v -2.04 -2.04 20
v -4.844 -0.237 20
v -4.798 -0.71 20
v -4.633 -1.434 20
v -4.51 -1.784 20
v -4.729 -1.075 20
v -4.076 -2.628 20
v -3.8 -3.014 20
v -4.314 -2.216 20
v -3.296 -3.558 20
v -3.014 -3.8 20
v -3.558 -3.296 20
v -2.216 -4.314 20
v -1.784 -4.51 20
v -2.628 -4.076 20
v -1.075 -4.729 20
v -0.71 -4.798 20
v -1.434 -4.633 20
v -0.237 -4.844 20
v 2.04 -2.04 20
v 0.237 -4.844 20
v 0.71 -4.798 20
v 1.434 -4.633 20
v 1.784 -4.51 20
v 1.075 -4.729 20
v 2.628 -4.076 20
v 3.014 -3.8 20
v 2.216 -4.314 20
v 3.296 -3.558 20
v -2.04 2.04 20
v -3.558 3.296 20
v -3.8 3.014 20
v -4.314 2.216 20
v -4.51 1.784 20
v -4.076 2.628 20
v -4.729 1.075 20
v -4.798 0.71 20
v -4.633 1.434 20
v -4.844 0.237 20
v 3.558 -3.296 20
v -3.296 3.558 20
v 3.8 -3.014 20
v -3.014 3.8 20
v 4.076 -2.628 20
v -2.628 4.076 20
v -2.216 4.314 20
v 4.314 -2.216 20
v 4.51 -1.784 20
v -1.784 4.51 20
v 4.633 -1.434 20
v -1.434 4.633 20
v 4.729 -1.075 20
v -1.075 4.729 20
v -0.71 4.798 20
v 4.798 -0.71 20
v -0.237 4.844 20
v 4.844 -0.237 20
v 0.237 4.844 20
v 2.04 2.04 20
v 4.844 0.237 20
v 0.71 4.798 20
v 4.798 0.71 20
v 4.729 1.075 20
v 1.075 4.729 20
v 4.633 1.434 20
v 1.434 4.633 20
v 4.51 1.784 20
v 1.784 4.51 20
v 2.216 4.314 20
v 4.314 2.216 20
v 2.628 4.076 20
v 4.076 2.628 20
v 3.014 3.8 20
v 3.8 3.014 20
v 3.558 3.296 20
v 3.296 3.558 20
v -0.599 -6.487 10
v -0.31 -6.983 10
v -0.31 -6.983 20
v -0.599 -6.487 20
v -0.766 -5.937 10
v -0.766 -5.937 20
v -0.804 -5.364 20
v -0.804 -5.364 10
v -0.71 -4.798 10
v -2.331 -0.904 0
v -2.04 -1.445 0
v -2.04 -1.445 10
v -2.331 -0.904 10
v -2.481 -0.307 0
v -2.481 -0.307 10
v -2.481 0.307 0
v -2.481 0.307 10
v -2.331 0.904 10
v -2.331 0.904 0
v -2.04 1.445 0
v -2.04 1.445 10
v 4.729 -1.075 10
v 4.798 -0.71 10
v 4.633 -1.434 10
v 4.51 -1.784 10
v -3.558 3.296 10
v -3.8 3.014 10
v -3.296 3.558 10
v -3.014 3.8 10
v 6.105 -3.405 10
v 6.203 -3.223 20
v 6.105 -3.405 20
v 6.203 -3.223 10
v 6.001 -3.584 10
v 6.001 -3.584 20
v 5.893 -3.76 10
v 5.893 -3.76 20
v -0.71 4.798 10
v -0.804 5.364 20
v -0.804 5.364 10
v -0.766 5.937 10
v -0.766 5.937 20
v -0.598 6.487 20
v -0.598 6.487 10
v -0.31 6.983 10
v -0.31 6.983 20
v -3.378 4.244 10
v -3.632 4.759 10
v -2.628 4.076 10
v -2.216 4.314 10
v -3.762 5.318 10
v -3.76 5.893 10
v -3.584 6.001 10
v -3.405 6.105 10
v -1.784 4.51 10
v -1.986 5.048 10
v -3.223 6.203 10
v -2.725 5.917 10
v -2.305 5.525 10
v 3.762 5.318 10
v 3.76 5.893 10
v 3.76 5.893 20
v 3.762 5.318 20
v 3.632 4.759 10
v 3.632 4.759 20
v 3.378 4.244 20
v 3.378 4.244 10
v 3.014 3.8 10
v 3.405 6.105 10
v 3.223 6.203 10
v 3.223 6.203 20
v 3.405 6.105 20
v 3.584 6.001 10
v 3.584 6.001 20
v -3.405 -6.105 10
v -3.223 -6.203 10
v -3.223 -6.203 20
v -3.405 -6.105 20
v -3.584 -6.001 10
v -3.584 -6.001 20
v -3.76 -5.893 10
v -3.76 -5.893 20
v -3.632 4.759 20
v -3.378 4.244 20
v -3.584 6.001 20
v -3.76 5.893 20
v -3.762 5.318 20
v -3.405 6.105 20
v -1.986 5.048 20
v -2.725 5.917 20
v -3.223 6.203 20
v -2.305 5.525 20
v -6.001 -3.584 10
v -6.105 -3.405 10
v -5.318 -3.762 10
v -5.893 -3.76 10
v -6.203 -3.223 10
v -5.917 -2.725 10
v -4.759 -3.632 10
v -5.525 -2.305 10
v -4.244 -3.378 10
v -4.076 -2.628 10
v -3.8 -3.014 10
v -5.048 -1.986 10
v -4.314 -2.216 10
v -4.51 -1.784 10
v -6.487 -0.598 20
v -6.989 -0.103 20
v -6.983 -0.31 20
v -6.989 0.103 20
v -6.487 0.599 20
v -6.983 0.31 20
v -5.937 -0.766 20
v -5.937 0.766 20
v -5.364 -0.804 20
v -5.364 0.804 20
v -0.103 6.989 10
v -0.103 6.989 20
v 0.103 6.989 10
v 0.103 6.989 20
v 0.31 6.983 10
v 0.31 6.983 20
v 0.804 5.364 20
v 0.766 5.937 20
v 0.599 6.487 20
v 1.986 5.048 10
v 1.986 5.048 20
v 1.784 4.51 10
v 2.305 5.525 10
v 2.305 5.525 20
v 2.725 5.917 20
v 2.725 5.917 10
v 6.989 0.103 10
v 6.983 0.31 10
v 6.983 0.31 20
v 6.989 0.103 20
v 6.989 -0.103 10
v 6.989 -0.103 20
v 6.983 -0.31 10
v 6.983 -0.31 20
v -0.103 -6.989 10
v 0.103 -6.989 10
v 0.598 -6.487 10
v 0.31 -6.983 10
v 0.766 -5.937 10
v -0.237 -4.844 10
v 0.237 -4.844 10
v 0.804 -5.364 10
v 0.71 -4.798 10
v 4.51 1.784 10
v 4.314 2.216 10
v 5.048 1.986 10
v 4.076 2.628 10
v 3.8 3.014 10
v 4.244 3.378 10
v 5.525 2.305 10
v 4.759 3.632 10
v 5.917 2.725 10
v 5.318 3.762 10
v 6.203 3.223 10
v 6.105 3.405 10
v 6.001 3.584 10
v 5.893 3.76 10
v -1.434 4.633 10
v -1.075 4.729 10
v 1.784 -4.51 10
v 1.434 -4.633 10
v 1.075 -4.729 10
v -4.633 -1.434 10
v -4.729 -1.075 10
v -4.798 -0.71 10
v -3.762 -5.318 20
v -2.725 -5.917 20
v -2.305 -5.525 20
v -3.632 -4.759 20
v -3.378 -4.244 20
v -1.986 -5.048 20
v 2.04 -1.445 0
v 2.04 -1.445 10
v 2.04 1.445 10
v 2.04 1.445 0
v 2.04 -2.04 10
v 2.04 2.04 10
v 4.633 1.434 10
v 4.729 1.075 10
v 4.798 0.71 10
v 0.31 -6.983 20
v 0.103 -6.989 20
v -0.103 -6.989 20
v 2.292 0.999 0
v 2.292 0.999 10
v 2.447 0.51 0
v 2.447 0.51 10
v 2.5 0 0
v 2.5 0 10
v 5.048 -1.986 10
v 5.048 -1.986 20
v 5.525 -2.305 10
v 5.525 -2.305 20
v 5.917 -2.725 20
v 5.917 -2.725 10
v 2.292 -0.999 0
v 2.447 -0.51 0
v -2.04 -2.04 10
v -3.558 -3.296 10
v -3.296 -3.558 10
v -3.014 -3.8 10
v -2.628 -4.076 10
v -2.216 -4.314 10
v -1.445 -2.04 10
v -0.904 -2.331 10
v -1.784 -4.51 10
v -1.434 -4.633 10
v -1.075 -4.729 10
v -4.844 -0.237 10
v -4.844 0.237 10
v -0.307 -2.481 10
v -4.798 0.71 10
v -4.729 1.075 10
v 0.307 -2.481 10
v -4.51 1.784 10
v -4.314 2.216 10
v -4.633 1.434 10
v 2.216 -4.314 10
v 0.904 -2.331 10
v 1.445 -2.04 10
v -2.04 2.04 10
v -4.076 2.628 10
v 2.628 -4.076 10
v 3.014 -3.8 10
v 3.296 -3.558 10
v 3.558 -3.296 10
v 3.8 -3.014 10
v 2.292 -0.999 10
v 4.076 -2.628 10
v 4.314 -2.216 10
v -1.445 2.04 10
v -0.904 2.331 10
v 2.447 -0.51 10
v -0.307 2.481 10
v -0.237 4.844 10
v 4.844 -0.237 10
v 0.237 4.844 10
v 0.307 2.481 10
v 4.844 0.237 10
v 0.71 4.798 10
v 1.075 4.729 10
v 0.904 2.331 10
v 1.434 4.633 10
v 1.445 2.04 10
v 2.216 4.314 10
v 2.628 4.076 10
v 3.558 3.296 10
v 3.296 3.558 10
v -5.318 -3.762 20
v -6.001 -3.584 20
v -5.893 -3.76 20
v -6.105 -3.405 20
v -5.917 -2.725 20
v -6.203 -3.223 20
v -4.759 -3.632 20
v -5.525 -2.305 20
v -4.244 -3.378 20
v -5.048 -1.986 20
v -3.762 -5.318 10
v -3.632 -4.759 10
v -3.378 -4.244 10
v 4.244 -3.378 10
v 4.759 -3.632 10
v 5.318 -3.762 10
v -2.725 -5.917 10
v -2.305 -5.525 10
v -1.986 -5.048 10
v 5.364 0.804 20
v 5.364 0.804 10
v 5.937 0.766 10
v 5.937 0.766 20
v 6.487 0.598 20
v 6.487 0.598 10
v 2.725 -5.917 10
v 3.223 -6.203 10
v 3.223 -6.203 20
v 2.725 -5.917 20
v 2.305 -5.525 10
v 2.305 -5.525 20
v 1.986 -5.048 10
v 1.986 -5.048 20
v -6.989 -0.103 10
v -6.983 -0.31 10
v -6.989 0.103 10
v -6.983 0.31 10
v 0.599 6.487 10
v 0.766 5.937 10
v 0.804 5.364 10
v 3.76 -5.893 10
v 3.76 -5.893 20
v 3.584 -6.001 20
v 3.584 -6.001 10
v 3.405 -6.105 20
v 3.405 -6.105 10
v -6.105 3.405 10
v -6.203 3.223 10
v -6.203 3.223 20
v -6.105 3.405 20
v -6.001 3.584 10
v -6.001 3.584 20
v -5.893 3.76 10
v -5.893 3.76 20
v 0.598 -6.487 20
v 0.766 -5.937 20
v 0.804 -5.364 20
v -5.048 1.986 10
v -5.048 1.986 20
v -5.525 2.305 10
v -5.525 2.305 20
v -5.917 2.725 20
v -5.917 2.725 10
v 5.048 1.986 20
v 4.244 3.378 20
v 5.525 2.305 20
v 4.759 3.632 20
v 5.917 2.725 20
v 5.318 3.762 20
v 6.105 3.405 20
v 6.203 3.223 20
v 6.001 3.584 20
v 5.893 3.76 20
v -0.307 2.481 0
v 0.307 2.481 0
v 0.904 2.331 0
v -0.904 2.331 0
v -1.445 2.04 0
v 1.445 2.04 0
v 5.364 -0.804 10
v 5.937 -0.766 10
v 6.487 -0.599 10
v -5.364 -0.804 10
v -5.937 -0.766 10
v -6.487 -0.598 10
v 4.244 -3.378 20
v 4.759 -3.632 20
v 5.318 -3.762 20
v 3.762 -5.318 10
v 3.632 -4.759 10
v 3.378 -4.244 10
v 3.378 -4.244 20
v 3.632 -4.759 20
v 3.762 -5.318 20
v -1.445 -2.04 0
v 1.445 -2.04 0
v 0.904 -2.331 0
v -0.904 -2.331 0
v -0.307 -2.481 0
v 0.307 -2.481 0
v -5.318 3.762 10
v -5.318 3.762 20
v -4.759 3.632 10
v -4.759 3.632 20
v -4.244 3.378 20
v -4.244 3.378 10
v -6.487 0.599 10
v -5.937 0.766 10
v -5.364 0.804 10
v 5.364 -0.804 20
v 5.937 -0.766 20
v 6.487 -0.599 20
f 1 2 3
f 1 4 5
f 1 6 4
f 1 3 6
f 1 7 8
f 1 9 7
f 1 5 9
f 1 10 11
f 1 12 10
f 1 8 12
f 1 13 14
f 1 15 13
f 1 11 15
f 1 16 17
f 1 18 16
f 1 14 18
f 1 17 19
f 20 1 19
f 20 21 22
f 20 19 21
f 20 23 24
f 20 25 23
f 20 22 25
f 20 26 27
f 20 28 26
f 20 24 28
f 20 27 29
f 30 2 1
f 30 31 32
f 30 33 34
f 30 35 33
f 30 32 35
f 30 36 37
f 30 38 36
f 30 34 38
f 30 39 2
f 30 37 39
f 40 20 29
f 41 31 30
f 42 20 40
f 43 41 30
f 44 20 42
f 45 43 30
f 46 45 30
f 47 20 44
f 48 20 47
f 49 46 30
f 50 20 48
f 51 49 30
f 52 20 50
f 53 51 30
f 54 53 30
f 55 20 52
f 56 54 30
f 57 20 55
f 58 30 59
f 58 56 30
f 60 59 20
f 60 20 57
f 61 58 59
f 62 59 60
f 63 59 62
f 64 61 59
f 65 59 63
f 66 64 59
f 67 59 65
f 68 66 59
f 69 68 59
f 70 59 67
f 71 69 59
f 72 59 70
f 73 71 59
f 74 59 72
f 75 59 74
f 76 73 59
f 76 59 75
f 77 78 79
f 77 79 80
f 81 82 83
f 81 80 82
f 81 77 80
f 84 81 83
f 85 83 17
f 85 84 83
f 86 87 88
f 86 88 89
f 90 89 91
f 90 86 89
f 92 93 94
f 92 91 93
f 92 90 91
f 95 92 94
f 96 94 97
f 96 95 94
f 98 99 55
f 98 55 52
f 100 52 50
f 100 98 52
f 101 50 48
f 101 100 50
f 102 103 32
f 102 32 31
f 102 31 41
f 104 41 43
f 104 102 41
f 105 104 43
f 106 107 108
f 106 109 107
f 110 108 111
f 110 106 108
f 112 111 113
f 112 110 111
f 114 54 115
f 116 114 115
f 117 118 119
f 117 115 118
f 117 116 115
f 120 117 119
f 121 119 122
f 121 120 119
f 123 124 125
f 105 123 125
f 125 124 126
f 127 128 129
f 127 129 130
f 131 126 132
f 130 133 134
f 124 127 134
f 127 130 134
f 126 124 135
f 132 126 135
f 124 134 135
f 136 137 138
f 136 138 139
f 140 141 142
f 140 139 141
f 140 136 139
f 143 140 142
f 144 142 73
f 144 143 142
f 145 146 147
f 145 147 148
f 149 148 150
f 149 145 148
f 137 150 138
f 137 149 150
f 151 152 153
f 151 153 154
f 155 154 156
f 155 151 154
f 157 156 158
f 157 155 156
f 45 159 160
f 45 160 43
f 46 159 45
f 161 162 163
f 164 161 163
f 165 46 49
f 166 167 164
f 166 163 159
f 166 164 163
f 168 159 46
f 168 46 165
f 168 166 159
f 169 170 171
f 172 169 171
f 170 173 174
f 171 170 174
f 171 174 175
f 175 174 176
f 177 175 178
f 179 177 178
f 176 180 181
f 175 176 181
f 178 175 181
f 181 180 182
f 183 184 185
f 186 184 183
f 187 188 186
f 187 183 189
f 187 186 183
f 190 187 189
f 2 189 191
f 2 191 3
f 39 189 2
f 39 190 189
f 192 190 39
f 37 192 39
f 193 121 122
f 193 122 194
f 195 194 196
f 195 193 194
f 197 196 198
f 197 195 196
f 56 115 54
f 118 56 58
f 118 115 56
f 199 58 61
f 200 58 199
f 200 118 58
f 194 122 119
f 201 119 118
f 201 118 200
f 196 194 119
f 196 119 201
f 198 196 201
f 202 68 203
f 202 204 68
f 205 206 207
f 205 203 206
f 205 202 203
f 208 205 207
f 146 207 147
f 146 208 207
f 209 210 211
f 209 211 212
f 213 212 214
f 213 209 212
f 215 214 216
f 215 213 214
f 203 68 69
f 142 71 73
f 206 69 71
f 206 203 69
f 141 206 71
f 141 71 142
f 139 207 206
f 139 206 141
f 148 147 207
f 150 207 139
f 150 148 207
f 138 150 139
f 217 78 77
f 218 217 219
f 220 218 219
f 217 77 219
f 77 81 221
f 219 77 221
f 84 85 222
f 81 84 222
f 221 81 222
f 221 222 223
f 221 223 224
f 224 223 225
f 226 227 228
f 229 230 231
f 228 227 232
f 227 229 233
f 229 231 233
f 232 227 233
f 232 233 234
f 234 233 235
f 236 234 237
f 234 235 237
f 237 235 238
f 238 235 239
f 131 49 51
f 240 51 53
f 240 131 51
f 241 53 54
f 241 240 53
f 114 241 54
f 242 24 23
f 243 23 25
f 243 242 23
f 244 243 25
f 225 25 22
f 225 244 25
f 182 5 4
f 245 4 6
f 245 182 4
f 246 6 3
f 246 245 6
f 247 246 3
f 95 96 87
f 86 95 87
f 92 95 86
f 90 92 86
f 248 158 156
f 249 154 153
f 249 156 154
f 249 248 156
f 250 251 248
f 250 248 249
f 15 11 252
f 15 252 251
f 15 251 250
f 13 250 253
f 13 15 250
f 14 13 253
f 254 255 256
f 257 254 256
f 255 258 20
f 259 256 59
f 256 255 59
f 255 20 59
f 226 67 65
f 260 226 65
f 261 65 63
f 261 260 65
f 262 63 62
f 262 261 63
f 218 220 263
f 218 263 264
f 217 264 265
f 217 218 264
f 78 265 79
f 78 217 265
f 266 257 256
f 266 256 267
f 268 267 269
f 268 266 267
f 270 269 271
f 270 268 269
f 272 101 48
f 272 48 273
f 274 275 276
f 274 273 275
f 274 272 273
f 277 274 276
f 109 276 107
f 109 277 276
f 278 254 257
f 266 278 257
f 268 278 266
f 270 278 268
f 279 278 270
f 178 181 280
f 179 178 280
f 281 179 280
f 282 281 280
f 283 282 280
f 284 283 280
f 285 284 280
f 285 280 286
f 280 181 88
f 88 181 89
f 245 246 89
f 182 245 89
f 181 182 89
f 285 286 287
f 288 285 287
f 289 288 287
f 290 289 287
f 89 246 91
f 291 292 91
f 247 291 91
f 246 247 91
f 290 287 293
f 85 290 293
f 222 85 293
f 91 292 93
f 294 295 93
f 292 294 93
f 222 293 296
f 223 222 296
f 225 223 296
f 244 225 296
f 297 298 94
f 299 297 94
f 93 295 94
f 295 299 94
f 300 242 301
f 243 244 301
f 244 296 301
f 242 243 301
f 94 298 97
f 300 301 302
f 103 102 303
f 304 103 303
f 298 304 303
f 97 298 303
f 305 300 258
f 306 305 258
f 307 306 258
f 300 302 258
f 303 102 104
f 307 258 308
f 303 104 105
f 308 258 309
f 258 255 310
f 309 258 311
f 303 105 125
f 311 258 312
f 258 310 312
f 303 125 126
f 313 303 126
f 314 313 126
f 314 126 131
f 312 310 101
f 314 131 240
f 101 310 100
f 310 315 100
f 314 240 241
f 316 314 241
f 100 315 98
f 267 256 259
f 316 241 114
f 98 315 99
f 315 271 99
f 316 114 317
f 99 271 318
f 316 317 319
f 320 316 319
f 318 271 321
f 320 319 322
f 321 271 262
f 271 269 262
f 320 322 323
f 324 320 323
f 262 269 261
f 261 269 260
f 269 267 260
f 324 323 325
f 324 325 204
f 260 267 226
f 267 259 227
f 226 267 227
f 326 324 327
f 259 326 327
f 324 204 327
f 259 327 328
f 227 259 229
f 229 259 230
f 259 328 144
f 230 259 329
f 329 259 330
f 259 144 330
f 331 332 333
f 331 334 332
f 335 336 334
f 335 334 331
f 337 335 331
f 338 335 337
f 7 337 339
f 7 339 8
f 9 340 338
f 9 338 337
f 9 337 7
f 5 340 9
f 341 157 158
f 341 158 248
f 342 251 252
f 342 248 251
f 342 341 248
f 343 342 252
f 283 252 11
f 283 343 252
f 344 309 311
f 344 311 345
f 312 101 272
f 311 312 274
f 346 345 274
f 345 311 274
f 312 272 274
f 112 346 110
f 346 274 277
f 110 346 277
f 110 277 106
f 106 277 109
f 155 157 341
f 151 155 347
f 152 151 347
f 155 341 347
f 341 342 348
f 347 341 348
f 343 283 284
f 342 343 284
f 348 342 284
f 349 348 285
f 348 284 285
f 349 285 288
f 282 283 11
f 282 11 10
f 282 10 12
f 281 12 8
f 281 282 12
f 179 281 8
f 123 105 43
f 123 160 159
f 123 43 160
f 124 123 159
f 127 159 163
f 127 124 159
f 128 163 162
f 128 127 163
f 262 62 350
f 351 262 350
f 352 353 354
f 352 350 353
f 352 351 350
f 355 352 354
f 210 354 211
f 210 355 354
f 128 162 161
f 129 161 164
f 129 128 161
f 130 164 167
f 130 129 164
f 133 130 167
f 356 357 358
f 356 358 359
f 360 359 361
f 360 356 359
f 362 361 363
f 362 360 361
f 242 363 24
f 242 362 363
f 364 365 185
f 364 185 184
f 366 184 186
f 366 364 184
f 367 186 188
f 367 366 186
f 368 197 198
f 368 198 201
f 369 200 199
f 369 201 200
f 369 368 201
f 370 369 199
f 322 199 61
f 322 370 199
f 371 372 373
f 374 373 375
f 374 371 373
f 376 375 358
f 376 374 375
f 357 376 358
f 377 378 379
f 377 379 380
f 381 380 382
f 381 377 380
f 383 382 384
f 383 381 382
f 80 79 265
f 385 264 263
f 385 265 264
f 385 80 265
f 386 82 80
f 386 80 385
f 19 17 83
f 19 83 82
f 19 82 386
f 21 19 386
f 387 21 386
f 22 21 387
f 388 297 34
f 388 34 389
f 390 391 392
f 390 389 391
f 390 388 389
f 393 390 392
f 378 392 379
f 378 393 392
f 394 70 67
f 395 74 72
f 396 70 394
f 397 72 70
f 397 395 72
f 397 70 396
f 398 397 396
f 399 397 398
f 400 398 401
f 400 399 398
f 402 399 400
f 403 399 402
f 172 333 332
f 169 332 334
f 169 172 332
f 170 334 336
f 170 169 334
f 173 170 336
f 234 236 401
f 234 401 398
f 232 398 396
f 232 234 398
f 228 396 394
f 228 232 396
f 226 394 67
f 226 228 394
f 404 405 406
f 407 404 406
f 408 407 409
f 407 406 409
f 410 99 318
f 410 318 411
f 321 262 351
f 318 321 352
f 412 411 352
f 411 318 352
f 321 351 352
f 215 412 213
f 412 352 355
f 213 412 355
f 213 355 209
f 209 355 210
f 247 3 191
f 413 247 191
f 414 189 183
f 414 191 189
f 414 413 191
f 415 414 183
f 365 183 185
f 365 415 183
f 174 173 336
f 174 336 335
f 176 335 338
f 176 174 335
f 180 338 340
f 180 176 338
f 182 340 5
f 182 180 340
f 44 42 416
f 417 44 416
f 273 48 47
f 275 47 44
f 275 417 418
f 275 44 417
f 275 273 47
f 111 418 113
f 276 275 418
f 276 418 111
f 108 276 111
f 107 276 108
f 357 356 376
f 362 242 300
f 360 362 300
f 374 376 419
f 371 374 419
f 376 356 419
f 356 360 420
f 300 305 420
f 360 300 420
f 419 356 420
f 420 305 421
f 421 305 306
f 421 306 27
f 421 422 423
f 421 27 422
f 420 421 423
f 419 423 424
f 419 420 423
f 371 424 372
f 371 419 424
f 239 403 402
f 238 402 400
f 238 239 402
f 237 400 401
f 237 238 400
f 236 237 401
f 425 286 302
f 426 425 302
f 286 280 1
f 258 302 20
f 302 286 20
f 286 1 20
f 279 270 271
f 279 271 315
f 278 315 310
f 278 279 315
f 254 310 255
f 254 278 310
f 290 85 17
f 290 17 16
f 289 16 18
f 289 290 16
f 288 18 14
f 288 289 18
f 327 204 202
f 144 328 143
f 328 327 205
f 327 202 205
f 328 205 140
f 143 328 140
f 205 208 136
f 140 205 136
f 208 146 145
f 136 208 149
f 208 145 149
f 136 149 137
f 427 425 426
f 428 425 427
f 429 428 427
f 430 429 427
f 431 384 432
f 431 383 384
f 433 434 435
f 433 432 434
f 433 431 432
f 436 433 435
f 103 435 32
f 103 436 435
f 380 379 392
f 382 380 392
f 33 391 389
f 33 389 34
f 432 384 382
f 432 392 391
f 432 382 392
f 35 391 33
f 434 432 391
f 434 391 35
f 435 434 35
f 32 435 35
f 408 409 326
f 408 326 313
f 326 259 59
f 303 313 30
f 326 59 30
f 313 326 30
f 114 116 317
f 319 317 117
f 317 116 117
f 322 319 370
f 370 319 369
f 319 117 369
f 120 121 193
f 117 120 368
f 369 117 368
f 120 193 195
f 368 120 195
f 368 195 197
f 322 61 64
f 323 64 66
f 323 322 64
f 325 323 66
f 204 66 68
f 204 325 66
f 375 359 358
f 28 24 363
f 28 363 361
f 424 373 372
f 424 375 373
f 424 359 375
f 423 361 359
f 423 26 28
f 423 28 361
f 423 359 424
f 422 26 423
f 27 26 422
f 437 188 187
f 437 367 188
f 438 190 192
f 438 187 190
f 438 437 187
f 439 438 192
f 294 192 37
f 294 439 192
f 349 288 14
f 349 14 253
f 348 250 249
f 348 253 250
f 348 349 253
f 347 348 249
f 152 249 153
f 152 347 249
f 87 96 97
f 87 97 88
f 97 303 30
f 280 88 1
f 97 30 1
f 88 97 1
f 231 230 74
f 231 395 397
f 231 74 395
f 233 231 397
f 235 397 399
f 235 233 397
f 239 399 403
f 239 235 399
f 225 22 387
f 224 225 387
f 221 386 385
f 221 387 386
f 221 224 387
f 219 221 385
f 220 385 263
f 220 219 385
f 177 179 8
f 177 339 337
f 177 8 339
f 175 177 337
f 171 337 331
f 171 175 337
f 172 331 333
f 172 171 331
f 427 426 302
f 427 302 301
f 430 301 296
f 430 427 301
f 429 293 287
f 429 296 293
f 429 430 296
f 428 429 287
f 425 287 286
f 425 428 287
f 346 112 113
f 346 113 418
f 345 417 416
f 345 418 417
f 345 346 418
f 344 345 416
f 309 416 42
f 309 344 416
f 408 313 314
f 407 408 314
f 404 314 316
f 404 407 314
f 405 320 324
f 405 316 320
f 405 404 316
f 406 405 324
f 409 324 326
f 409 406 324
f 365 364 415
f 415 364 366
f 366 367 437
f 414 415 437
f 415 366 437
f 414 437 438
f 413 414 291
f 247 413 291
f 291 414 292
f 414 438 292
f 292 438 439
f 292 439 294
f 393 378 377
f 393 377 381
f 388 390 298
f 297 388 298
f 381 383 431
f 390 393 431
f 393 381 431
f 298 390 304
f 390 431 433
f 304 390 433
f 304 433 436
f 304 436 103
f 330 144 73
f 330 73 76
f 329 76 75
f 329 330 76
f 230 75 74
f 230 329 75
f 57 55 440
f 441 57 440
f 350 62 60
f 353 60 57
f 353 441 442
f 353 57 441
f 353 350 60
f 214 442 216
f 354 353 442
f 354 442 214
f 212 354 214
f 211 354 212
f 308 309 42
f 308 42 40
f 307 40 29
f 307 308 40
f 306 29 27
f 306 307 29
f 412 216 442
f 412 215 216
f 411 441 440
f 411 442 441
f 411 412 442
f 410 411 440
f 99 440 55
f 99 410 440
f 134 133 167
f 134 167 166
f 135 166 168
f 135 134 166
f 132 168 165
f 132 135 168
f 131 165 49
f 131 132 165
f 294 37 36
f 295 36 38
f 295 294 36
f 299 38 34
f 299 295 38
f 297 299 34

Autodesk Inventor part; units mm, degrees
ref_plane "YZ Plane" through (0, 0, 0) normal (1, 0, 0) x (0, 1, 0)
ref_plane "XZ Plane" through (0, 0, 0) normal (0, 1, 0) x (-1, 0, 0)
ref_plane "XY Plane" through (0, 0, 0) normal (0, 0, 1) x (1, 0, 0)
sketch "Sketch1" plane through (0, 0, 0) normal (0, 0, 1) x (1, 0, 0)
  circle A0 centre (0, 0) radius 2.5
  dimension "d0" = 5
extrude "Extrusion1" add sketch "Sketch1" along normal blind 10
sketch "Sketch2" plane through (0, 0, 10) normal (0, 0, 1) x (1, 0, 0)
  circle A0 centre (0, 0) radius 6.99
  circle A1 centre (0, 0) radius 4.85
  line L0 (-6.99, 0) -> (6.99, 0)
  arc A2 (6.9831, 0.31) -> (4.7977, 0.71) centre (5.4872, -1.6931) ccw
  arc A3 (4.7977, -0.71) -> (6.9831, -0.31) centre (5.4872, 1.6931) ccw
  point P0 (4.8336, 0.3987)
  point P1 (4.7977, -0.71)
  point P2 (6.9831, -0.31)
  dimension "d3" = 13.98
  dimension "d17" = 9.7
  dimension "d18" = 0.62
  dimension "d19" = 1.42
  dimension "d20" = 2.5
extrude "Extrusion2" add sketch "Sketch2" along normal blind 10 contours L0 A1 | A1 L0
extrude "Extrusion3" add sketch "Sketch2" along normal up to surface (10 mm away) contours L0 A1 A2 A0 | A0 A3 A1 L0 | L0 A1 | A1 L0 picked at (6.1088, 0.1995) picked at (6.1089, -0.1995)
pattern_circular "Circular Pattern1" count 12 over 360 about axis through (0, 0, -10) along (0, 0, 1) of "Extrusion3"
sketch "Sketch3" plane through (0, 0, 20) normal (0, 0, 1) x (1, 0, 0)
  line L0 (-2.04, -2.04) -> (2.04, -2.04)
  line L1 (2.04, -2.04) -> (2.04, 2.04)
  line L2 (2.04, 2.04) -> (-2.04, 2.04)
  line L3 (-2.04, 2.04) -> (-2.04, -2.04)
  line L4 (-2.04, -2.04) -> (2.04, 2.04) construction
  line L5 (2.04, -2.04) -> (-2.04, 2.04) construction
  point P0 (0, 0)
  dimension "d22" = 4.08
extrude "Extrusion4" cut sketch "Sketch3" against normal through all
properties part number "Pinion Gear"
